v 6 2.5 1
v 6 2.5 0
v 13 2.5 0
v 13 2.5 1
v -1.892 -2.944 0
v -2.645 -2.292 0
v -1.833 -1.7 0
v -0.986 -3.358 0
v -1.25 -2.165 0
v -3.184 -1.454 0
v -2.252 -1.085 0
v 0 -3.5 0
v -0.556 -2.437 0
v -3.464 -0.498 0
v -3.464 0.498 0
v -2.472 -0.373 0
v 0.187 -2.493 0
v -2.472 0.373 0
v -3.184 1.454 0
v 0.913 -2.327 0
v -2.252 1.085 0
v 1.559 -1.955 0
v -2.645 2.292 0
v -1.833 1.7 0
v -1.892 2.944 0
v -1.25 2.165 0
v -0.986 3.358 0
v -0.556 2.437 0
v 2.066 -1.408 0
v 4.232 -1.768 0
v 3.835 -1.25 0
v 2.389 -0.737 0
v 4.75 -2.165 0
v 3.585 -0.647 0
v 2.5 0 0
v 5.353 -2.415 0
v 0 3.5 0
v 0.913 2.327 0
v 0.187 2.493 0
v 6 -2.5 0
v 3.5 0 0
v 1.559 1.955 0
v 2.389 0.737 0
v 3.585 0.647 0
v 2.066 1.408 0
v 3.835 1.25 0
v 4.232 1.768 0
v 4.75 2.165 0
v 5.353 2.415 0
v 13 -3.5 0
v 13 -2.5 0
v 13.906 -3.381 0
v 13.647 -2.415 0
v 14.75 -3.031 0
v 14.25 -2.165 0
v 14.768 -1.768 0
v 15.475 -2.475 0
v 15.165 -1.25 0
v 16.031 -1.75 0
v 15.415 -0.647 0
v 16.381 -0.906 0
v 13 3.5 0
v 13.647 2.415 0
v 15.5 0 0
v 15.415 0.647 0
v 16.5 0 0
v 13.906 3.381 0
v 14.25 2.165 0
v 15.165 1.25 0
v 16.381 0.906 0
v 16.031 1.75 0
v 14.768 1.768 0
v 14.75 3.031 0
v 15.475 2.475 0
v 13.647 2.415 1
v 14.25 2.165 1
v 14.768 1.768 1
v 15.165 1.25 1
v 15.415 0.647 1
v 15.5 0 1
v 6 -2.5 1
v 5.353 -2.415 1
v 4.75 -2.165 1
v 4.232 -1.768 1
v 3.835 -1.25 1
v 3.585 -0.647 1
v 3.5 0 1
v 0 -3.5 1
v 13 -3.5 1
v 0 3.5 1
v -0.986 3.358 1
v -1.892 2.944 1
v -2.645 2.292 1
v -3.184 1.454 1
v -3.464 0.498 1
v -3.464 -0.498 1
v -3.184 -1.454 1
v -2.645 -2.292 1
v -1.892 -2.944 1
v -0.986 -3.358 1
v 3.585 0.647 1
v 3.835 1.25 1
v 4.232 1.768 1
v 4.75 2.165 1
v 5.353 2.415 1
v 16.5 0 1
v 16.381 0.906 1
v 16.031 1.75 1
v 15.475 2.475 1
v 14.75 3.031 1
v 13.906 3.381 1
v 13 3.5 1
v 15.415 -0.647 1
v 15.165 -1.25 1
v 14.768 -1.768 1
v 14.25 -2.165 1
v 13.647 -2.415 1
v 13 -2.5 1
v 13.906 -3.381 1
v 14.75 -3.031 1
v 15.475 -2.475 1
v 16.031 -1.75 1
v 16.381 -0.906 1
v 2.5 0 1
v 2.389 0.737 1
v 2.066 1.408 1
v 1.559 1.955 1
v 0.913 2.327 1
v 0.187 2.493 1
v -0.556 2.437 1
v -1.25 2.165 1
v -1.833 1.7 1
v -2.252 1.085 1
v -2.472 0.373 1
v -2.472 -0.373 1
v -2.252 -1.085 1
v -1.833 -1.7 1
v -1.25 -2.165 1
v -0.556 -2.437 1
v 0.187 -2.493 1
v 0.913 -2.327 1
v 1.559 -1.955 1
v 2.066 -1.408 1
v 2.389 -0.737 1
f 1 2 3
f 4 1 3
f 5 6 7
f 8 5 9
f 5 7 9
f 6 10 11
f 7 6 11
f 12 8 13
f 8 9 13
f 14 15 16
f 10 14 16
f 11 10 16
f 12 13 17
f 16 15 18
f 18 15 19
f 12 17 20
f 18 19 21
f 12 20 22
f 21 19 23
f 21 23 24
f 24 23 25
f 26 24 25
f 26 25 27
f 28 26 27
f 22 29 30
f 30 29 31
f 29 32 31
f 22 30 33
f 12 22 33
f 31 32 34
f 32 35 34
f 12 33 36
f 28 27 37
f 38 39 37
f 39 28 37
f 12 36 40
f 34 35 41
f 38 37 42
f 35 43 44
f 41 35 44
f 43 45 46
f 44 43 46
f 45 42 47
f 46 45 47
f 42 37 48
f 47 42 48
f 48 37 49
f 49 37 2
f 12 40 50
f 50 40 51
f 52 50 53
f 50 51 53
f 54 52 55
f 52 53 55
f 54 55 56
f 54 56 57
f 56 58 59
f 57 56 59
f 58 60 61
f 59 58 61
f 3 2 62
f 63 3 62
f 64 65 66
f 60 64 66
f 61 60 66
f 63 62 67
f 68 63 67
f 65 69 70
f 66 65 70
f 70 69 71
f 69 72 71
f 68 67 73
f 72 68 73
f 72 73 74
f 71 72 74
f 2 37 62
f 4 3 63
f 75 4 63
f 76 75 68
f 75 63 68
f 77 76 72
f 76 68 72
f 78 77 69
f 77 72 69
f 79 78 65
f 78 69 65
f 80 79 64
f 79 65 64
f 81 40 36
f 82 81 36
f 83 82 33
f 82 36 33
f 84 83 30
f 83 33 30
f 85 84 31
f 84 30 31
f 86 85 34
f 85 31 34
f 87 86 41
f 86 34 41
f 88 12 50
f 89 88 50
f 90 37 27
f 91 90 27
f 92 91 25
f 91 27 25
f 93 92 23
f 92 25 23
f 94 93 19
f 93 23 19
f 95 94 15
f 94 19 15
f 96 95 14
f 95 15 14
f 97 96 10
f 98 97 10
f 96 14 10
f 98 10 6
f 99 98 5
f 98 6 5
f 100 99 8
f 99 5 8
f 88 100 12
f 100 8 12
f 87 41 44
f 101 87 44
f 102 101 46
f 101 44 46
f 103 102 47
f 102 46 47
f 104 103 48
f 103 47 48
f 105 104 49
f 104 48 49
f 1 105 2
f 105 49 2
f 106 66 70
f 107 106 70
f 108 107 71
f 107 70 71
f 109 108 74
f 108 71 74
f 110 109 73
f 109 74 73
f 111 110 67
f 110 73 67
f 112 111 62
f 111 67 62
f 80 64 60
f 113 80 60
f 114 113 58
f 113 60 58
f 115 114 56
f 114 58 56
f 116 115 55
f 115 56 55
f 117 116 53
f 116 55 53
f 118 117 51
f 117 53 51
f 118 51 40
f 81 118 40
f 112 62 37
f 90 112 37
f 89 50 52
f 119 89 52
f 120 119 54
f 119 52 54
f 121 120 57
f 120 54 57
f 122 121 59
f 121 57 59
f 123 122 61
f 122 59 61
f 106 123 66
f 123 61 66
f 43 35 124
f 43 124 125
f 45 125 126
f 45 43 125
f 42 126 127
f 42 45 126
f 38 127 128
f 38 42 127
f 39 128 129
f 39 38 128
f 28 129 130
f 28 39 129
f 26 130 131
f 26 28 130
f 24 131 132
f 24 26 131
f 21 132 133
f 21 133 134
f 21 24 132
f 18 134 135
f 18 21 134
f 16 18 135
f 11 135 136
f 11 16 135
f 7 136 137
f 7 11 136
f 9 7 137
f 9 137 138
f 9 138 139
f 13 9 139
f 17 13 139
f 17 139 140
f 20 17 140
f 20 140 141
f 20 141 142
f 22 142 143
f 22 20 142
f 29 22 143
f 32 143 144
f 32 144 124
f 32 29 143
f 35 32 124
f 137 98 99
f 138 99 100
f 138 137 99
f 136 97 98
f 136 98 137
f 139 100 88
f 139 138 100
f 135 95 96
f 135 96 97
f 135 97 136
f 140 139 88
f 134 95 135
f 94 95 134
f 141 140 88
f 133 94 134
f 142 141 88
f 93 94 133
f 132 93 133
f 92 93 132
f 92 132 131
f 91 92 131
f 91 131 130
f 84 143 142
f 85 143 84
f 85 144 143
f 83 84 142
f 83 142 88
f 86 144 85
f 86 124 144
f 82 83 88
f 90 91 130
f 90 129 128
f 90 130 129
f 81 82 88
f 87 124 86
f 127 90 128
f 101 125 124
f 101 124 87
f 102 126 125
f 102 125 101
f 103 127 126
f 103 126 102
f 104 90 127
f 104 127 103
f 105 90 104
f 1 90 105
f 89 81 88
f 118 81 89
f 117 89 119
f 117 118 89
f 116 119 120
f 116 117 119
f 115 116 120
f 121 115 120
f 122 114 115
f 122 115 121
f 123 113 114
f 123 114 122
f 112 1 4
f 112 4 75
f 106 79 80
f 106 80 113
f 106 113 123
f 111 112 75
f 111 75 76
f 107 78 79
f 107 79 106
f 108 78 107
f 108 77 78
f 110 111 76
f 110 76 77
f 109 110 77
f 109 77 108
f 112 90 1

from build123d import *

# Parameters (mm, degrees)
F0_R     = 2.5
F2_DEPTH = 1


with BuildPart() as f2:
    # F0 (on Top) → F2 (new body)
    with BuildSketch(Plane.XY):
        with BuildLine():
            ThreePointArc((6, -2.5), (4.232233047, -1.767766953), (3.5, 0))
            ThreePointArc((3.5, 0), (2.4748737342, -2.4748737342), (0, -3.5))
            Line((0, -3.5), (13, -3.5))
            ThreePointArc((13, -3.5), (11.6771243445, -3.2403703492), (10.5505102572, -2.5))
            Line((10.5505102572, -2.5), (6, -2.5))
        make_face()
        with BuildLine():
            ThreePointArc((16.5, 0), (15.4748737342, 2.4748737342), (13, 3.5))
            ThreePointArc((13, 3.5), (11.6771243445, 3.2403703492), (10.5505102572, 2.5))
            Line((10.5505102572, 2.5), (13, 2.5))
            ThreePointArc((13, 2.5), (14.767766953, 1.767766953), (15.5, 0))
            ThreePointArc((15.5, 0), (14.767766953, -1.767766953), (13, -2.5))
            Line((13, -2.5), (10.5505102572, -2.5))
            ThreePointArc((10.5505102572, -2.5), (11.6771243445, -3.2403703492), (13, -3.5))
            ThreePointArc((13, -3.5), (15.4748737342, -2.4748737342), (16.5, 0))
        make_face()
        with BuildLine():
            ThreePointArc((0, 3.5), (2.4748737342, 2.4748737342), (3.5, 0))
            ThreePointArc((3.5, 0), (4.232233047, 1.767766953), (6, 2.5))
            Line((6, 2.5), (10.5505102572, 2.5))
            ThreePointArc((10.5505102572, 2.5), (11.6771243445, 3.2403703492), (13, 3.5))
            Line((13, 3.5), (0, 3.5))
        make_face()
        with BuildLine():
            ThreePointArc((0, -3.5), (2.4748737342, -2.4748737342), (3.5, 0))
            ThreePointArc((3.5, 0), (2.4748737342, 2.4748737342), (0, 3.5))
            ThreePointArc((0, 3.5), (-3.5, 0), (0, -3.5))
        make_face()
        Circle(F0_R, mode=Mode.SUBTRACT)
    extrude(amount=F2_DEPTH)


solid = f2.part
